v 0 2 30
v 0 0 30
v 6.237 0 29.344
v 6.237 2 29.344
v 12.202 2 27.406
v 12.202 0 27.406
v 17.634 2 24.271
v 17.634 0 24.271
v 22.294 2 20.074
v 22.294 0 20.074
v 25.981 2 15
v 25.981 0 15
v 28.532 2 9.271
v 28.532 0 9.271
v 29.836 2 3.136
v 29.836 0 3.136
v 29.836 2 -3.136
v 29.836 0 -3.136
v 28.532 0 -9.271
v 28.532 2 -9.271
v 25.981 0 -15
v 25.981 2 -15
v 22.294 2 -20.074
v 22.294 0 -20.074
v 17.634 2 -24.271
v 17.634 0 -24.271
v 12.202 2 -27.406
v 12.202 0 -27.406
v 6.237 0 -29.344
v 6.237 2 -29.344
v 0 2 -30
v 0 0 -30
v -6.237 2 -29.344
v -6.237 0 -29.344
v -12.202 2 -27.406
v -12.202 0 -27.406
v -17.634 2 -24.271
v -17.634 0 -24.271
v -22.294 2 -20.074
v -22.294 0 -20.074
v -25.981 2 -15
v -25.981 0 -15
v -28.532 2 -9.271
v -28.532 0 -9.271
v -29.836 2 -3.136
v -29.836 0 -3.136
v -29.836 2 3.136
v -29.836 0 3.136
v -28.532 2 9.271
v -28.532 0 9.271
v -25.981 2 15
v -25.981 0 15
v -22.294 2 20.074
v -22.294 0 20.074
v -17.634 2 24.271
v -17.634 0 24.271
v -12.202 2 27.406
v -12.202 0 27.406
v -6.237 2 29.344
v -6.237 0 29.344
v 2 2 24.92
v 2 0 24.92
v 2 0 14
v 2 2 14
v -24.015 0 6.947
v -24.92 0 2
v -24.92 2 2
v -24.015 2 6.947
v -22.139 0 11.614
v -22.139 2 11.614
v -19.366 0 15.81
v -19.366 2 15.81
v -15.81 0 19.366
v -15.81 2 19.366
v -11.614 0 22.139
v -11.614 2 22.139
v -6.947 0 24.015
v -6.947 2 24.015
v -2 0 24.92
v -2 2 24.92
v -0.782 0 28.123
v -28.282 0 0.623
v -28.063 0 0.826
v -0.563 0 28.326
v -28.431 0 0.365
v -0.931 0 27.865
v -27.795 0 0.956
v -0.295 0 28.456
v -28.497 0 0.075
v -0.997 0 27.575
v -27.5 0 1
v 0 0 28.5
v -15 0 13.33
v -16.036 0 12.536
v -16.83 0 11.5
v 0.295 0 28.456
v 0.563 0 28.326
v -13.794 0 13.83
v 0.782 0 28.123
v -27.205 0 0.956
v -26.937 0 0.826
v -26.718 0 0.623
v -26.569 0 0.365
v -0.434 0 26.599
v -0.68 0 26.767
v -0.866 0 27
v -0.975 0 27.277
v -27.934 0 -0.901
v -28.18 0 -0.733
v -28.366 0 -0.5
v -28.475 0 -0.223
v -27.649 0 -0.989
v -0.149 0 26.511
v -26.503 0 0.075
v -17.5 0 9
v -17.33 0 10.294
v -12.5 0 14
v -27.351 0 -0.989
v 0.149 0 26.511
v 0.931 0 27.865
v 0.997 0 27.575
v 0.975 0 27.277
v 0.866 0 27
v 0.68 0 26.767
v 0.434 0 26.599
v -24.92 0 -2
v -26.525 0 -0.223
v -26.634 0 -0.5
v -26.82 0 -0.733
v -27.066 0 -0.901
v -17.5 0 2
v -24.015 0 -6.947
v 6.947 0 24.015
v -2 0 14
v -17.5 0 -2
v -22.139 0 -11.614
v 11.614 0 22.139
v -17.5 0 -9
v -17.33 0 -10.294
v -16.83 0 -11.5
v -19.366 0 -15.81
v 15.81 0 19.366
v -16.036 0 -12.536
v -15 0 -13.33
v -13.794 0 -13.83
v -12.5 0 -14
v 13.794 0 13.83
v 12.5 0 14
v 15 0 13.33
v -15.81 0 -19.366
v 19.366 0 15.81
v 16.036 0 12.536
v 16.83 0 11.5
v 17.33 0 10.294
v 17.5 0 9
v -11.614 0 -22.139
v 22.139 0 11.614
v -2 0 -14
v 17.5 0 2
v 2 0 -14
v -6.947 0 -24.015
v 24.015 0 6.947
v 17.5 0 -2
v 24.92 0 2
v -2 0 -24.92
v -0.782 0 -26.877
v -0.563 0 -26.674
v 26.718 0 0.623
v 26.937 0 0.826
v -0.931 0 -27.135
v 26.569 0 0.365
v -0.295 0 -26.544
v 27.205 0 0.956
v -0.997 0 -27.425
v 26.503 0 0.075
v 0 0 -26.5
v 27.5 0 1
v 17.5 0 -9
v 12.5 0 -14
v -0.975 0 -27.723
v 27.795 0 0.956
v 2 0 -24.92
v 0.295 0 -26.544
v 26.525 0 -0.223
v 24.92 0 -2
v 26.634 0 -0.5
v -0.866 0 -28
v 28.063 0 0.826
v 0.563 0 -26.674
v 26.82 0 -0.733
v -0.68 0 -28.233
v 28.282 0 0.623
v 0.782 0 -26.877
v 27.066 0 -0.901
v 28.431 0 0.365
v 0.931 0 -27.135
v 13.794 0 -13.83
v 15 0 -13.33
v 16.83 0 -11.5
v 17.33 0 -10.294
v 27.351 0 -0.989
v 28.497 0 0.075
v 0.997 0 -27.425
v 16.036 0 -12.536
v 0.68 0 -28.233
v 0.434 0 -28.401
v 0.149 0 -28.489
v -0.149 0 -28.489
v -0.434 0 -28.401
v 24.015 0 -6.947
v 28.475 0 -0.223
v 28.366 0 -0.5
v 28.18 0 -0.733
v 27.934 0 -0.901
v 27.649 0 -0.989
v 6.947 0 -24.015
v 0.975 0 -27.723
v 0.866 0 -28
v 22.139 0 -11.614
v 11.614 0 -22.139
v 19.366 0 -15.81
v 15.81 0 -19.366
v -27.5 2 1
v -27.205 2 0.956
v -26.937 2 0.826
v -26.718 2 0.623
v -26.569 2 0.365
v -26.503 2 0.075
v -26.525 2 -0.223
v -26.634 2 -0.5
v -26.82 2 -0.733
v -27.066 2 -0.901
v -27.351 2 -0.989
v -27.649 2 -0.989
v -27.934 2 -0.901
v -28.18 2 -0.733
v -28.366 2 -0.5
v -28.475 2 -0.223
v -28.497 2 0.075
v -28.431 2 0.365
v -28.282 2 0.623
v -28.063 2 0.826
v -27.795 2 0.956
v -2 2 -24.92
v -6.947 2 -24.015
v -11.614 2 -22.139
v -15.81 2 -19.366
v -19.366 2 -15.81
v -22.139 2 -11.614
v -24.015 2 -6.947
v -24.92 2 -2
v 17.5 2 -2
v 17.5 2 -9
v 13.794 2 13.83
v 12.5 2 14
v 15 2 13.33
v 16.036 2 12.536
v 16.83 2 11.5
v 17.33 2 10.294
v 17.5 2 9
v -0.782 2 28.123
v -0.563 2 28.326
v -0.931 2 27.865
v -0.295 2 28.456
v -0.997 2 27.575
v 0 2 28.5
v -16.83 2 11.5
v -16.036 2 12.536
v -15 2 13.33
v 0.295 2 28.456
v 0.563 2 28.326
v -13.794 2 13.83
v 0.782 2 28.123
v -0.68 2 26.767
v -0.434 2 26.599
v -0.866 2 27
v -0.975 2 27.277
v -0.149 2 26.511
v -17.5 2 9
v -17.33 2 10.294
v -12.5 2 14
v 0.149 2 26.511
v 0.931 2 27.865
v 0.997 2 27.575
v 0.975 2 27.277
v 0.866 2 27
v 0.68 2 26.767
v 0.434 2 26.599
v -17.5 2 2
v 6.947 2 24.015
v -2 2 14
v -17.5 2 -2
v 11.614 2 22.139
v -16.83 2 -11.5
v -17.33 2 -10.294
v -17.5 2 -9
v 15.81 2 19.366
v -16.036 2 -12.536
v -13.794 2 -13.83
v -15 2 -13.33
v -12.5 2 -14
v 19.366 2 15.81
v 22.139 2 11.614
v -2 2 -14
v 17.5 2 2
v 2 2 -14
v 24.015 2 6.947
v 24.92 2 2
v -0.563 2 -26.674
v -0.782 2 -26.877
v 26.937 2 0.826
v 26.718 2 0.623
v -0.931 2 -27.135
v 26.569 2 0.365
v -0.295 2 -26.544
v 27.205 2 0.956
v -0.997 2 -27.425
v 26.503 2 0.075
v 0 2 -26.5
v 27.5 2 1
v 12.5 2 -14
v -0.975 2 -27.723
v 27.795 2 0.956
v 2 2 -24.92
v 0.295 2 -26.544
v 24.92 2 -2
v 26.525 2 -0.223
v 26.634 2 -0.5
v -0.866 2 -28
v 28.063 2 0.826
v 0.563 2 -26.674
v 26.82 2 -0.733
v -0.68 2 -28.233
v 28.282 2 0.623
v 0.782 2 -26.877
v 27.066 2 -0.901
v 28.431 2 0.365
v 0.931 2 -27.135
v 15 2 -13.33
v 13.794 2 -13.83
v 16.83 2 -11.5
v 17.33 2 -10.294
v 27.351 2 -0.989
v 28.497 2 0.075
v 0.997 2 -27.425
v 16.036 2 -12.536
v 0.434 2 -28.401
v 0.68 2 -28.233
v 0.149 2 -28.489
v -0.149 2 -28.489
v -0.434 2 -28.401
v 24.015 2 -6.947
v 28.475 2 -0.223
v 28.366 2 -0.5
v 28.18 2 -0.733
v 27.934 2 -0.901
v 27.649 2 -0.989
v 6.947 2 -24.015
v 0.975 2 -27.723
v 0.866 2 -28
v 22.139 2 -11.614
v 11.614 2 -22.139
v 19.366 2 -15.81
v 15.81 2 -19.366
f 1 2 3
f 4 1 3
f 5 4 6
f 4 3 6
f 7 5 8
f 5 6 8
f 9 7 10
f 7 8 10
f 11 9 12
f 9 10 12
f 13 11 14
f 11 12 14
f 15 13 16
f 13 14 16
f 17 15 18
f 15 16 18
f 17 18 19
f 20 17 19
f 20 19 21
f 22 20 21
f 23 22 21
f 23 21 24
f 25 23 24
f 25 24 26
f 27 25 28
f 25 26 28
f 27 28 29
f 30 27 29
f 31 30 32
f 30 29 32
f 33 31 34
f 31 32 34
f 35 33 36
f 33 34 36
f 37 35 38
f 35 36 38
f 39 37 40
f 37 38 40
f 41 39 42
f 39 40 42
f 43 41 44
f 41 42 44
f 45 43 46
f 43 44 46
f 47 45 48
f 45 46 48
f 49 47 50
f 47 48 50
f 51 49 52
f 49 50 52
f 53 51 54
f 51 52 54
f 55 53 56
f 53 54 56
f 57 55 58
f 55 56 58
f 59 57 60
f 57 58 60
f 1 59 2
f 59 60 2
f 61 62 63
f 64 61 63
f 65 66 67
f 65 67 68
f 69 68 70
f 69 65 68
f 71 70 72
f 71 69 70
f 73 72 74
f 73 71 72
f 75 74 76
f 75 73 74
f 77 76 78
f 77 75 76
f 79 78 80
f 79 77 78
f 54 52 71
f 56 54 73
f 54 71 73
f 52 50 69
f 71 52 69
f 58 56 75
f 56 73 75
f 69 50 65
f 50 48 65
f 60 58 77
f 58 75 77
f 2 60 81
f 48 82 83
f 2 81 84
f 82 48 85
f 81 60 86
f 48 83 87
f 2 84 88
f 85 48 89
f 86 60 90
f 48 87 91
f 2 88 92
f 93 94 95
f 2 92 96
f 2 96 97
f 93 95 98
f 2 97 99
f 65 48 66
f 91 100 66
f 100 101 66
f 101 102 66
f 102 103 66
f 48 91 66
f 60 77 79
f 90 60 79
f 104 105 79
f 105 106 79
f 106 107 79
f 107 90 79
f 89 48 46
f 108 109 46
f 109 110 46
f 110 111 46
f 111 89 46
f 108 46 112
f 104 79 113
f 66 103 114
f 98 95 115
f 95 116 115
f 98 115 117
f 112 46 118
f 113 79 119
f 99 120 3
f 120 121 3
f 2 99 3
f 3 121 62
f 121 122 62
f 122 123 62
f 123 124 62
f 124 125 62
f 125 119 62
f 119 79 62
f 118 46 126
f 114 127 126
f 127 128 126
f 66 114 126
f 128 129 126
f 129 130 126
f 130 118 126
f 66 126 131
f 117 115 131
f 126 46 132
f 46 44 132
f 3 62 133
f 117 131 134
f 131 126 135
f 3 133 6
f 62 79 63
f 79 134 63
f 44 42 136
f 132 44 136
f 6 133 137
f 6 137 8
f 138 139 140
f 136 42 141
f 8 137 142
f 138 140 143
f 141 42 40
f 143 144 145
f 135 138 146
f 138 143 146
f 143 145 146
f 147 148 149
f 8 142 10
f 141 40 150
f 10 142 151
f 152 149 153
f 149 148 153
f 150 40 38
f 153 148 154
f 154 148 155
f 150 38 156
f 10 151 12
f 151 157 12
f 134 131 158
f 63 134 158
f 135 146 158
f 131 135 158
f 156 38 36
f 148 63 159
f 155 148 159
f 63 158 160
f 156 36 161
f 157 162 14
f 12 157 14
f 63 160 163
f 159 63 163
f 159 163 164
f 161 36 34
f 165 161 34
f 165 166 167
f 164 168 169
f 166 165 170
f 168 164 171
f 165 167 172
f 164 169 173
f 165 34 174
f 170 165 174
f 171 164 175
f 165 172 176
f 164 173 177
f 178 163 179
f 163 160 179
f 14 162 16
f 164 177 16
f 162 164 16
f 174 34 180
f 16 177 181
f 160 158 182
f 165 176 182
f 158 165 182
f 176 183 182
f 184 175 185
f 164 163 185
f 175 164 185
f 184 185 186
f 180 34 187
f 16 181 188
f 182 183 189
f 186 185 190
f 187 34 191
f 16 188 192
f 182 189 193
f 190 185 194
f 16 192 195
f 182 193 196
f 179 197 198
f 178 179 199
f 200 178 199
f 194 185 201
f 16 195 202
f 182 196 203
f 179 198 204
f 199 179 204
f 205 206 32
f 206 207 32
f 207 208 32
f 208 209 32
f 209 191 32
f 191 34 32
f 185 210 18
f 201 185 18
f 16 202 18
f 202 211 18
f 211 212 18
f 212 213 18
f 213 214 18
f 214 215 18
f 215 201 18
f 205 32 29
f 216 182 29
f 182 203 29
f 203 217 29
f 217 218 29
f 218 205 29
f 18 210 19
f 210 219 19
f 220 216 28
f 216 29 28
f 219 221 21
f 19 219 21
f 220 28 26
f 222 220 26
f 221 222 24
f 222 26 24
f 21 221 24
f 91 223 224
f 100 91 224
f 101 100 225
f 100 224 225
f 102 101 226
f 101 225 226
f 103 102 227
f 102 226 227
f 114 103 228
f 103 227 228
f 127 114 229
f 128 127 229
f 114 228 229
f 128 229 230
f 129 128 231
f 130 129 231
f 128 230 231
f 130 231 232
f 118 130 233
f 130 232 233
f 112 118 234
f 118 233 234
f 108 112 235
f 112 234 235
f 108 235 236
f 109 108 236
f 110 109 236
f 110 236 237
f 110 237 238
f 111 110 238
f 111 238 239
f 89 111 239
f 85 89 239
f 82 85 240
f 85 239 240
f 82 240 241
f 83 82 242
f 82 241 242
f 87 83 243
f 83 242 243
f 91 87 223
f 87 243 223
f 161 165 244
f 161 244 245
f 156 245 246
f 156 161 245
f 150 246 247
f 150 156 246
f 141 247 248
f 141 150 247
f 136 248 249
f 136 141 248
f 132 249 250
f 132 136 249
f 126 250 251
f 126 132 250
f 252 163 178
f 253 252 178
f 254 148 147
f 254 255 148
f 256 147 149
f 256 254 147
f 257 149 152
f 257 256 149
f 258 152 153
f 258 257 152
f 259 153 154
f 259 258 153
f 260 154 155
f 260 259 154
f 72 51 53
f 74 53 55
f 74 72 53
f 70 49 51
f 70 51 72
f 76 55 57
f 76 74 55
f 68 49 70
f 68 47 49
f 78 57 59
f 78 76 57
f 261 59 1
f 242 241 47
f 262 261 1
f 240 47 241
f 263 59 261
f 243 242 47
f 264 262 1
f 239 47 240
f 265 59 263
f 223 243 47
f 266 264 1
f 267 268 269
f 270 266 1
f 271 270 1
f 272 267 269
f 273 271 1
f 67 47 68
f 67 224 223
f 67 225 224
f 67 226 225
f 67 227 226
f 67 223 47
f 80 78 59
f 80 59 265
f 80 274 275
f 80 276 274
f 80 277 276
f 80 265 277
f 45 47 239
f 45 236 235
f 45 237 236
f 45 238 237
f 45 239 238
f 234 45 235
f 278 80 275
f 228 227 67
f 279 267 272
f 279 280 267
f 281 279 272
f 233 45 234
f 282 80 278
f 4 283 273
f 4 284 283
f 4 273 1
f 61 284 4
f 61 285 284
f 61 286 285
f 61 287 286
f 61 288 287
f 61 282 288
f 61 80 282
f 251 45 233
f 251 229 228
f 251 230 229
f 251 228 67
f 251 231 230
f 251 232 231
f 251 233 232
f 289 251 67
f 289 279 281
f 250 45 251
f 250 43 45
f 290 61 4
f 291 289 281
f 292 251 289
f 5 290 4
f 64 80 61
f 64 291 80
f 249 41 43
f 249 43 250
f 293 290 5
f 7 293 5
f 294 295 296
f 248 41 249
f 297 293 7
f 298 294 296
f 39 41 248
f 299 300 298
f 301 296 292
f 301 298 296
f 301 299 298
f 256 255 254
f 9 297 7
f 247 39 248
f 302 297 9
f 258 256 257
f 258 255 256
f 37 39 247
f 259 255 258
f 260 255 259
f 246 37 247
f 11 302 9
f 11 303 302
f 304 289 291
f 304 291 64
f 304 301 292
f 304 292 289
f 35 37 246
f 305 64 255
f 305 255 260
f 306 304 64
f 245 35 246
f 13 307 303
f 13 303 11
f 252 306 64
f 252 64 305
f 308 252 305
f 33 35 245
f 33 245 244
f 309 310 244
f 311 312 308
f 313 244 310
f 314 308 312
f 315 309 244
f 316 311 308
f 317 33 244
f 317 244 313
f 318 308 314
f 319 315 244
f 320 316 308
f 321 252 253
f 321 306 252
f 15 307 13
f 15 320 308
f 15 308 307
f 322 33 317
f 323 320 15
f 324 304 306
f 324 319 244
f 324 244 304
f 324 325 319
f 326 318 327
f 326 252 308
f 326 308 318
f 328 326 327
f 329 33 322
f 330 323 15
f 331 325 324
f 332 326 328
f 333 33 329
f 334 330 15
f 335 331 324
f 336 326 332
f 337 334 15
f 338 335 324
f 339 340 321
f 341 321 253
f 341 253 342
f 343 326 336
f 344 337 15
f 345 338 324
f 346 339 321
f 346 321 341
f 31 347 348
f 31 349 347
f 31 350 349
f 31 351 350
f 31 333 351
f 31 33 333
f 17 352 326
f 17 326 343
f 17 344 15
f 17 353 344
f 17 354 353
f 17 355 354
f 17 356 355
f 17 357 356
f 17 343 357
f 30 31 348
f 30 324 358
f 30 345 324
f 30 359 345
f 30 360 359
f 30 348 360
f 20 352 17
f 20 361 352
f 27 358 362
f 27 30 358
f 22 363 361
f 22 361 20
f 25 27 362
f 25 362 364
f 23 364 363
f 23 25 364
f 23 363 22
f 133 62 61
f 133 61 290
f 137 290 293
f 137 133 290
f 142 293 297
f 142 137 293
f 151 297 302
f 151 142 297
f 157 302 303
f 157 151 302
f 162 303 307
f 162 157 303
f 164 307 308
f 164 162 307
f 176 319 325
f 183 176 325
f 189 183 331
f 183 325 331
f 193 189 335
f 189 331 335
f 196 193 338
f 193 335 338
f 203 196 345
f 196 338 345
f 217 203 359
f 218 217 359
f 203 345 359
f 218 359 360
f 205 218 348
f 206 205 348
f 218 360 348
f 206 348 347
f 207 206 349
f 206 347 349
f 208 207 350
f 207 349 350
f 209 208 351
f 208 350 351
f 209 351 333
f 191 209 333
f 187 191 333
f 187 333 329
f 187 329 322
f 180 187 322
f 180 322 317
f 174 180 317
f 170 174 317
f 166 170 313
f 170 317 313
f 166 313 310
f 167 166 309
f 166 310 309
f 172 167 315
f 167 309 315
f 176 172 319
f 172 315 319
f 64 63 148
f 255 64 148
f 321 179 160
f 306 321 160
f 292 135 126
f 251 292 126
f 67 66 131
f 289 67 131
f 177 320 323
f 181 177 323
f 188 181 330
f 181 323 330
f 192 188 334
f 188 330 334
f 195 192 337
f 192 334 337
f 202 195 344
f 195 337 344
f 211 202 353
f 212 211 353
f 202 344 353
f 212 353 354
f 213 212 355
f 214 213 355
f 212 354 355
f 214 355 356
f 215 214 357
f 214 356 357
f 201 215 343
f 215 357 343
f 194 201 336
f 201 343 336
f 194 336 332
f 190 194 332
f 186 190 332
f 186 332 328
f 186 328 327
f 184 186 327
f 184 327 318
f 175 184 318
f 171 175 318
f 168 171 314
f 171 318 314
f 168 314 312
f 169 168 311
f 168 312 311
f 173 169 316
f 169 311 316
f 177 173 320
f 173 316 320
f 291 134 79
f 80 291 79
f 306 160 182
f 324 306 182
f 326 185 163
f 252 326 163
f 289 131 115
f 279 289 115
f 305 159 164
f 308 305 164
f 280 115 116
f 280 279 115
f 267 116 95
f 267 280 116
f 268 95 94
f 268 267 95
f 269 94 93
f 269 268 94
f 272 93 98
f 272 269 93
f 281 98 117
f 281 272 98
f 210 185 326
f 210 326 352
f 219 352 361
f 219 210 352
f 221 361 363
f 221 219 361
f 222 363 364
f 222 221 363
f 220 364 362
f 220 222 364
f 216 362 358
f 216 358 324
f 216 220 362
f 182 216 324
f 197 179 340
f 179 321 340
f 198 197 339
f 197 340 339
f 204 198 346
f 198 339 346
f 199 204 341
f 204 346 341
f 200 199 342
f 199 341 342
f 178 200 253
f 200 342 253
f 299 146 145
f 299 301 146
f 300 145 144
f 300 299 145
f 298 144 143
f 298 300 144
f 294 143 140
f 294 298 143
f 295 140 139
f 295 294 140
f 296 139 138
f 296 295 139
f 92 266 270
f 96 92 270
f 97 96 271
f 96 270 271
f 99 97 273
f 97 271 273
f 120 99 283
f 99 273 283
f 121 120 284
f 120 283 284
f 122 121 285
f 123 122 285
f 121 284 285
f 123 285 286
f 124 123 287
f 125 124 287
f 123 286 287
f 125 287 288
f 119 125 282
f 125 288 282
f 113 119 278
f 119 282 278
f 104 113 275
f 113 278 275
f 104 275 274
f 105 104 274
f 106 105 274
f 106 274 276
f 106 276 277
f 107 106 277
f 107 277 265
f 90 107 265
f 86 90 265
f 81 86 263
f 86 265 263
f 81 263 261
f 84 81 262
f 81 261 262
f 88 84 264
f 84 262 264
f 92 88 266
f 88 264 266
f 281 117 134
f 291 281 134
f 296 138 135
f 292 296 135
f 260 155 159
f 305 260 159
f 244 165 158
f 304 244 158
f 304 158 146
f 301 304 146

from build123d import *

# Parameters (mm, degrees)
SKETCH1_R           = 30
SKETCH1_R_2         = 25
BOSS_EXTRUDE1_DEPTH = 2
SKETCH2_R           = 1
CUT_EXTRUDE1_DEPTH  = 2
BOSS_EXTRUDE2_DEPTH = 2
FILLET1_R           = 5


with BuildPart() as part:
    # Sketch1 → Boss-Extrude1 (new body)
    with BuildSketch(Plane(origin=(0, 0, 0), x_dir=(1, 0, 0), z_dir=(0, 1, 0))):
        with Locations(Location((0, 0, 0), (0, 0, 270))):
            Circle(SKETCH1_R)
        with Locations(Location((0, 0, 0), (0, 0, 270))):
            Circle(SKETCH1_R_2, mode=Mode.SUBTRACT)
    extrude(amount=BOSS_EXTRUDE1_DEPTH)

    # Sketch2 → Cut-Extrude1 (cut)
    with BuildSketch(Plane(origin=(0, 2, 0), x_dir=(1, 0, 0), z_dir=(0, 1, 0))):
        with Locations(Location((0, 27.5, 0), (0, 0, 270))):
            Circle(SKETCH2_R)
        with Locations(Location((27.5, 0, 0), (0, 0, 270))):
            Circle(SKETCH2_R)
        with Locations(Location((0, -27.5, 0), (0, 0, 270))):
            Circle(SKETCH2_R)
        with Locations(Location((-27.5, 0, 0), (0, 0, 270))):
            Circle(SKETCH2_R)
    extrude(amount=-CUT_EXTRUDE1_DEPTH, mode=Mode.SUBTRACT)

    # Sketch3 → Boss-Extrude2 (add)
    with BuildSketch(Plane(origin=(0, 0, 0), x_dir=(1, 0, 0), z_dir=(0, 1, 0))):
        with BuildLine():
            Line((17.5, 14), (2, 14))
            Line((2, 14), (2, 24.919871589))
            ThreePointArc((2, 24.919871589), (0, 25), (-2, 24.919871589))
            Line((-2, 24.919871589), (-2, 14))
            Line((-2, 14), (-17.5, 14))
            Line((-17.5, 14), (-17.5, 2))
            Line((-17.5, 2), (-24.919871589, 2))
            ThreePointArc((-24.919871589, 2), (-25, 0), (-24.919871589, -2))
            Line((-24.919871589, -2), (-17.5, -2))
            Line((-17.5, -2), (-17.5, -14))
            Line((-17.5, -14), (-2, -14))
            Line((-2, -14), (-2, -24.919871589))
            ThreePointArc((-2, -24.919871589), (0, -25), (2, -24.919871589))
            Line((2, -24.919871589), (2, -14))
            Line((2, -14), (17.5, -14))
            Line((17.5, -14), (17.5, -2))
            Line((17.5, -2), (24.919871589, -2))
            ThreePointArc((24.919871589, -2), (25, 0), (24.919871589, 2))
            Line((24.919871589, 2), (17.5, 2))
            Line((17.5, 2), (17.5, 14))
        make_face()
    extrude(amount=BOSS_EXTRUDE2_DEPTH)

    # Fillet1
    fillet1_edges = [part.edges().sort_by_distance(p)[0] for p in [
        (-17.5, 1, 14),
        (17.5, 1, 14),
        (17.5, 1, -14),
        (-17.5, 1, -14),
    ]]
    fillet(fillet1_edges, radius=FILLET1_R)


solid = part.part
